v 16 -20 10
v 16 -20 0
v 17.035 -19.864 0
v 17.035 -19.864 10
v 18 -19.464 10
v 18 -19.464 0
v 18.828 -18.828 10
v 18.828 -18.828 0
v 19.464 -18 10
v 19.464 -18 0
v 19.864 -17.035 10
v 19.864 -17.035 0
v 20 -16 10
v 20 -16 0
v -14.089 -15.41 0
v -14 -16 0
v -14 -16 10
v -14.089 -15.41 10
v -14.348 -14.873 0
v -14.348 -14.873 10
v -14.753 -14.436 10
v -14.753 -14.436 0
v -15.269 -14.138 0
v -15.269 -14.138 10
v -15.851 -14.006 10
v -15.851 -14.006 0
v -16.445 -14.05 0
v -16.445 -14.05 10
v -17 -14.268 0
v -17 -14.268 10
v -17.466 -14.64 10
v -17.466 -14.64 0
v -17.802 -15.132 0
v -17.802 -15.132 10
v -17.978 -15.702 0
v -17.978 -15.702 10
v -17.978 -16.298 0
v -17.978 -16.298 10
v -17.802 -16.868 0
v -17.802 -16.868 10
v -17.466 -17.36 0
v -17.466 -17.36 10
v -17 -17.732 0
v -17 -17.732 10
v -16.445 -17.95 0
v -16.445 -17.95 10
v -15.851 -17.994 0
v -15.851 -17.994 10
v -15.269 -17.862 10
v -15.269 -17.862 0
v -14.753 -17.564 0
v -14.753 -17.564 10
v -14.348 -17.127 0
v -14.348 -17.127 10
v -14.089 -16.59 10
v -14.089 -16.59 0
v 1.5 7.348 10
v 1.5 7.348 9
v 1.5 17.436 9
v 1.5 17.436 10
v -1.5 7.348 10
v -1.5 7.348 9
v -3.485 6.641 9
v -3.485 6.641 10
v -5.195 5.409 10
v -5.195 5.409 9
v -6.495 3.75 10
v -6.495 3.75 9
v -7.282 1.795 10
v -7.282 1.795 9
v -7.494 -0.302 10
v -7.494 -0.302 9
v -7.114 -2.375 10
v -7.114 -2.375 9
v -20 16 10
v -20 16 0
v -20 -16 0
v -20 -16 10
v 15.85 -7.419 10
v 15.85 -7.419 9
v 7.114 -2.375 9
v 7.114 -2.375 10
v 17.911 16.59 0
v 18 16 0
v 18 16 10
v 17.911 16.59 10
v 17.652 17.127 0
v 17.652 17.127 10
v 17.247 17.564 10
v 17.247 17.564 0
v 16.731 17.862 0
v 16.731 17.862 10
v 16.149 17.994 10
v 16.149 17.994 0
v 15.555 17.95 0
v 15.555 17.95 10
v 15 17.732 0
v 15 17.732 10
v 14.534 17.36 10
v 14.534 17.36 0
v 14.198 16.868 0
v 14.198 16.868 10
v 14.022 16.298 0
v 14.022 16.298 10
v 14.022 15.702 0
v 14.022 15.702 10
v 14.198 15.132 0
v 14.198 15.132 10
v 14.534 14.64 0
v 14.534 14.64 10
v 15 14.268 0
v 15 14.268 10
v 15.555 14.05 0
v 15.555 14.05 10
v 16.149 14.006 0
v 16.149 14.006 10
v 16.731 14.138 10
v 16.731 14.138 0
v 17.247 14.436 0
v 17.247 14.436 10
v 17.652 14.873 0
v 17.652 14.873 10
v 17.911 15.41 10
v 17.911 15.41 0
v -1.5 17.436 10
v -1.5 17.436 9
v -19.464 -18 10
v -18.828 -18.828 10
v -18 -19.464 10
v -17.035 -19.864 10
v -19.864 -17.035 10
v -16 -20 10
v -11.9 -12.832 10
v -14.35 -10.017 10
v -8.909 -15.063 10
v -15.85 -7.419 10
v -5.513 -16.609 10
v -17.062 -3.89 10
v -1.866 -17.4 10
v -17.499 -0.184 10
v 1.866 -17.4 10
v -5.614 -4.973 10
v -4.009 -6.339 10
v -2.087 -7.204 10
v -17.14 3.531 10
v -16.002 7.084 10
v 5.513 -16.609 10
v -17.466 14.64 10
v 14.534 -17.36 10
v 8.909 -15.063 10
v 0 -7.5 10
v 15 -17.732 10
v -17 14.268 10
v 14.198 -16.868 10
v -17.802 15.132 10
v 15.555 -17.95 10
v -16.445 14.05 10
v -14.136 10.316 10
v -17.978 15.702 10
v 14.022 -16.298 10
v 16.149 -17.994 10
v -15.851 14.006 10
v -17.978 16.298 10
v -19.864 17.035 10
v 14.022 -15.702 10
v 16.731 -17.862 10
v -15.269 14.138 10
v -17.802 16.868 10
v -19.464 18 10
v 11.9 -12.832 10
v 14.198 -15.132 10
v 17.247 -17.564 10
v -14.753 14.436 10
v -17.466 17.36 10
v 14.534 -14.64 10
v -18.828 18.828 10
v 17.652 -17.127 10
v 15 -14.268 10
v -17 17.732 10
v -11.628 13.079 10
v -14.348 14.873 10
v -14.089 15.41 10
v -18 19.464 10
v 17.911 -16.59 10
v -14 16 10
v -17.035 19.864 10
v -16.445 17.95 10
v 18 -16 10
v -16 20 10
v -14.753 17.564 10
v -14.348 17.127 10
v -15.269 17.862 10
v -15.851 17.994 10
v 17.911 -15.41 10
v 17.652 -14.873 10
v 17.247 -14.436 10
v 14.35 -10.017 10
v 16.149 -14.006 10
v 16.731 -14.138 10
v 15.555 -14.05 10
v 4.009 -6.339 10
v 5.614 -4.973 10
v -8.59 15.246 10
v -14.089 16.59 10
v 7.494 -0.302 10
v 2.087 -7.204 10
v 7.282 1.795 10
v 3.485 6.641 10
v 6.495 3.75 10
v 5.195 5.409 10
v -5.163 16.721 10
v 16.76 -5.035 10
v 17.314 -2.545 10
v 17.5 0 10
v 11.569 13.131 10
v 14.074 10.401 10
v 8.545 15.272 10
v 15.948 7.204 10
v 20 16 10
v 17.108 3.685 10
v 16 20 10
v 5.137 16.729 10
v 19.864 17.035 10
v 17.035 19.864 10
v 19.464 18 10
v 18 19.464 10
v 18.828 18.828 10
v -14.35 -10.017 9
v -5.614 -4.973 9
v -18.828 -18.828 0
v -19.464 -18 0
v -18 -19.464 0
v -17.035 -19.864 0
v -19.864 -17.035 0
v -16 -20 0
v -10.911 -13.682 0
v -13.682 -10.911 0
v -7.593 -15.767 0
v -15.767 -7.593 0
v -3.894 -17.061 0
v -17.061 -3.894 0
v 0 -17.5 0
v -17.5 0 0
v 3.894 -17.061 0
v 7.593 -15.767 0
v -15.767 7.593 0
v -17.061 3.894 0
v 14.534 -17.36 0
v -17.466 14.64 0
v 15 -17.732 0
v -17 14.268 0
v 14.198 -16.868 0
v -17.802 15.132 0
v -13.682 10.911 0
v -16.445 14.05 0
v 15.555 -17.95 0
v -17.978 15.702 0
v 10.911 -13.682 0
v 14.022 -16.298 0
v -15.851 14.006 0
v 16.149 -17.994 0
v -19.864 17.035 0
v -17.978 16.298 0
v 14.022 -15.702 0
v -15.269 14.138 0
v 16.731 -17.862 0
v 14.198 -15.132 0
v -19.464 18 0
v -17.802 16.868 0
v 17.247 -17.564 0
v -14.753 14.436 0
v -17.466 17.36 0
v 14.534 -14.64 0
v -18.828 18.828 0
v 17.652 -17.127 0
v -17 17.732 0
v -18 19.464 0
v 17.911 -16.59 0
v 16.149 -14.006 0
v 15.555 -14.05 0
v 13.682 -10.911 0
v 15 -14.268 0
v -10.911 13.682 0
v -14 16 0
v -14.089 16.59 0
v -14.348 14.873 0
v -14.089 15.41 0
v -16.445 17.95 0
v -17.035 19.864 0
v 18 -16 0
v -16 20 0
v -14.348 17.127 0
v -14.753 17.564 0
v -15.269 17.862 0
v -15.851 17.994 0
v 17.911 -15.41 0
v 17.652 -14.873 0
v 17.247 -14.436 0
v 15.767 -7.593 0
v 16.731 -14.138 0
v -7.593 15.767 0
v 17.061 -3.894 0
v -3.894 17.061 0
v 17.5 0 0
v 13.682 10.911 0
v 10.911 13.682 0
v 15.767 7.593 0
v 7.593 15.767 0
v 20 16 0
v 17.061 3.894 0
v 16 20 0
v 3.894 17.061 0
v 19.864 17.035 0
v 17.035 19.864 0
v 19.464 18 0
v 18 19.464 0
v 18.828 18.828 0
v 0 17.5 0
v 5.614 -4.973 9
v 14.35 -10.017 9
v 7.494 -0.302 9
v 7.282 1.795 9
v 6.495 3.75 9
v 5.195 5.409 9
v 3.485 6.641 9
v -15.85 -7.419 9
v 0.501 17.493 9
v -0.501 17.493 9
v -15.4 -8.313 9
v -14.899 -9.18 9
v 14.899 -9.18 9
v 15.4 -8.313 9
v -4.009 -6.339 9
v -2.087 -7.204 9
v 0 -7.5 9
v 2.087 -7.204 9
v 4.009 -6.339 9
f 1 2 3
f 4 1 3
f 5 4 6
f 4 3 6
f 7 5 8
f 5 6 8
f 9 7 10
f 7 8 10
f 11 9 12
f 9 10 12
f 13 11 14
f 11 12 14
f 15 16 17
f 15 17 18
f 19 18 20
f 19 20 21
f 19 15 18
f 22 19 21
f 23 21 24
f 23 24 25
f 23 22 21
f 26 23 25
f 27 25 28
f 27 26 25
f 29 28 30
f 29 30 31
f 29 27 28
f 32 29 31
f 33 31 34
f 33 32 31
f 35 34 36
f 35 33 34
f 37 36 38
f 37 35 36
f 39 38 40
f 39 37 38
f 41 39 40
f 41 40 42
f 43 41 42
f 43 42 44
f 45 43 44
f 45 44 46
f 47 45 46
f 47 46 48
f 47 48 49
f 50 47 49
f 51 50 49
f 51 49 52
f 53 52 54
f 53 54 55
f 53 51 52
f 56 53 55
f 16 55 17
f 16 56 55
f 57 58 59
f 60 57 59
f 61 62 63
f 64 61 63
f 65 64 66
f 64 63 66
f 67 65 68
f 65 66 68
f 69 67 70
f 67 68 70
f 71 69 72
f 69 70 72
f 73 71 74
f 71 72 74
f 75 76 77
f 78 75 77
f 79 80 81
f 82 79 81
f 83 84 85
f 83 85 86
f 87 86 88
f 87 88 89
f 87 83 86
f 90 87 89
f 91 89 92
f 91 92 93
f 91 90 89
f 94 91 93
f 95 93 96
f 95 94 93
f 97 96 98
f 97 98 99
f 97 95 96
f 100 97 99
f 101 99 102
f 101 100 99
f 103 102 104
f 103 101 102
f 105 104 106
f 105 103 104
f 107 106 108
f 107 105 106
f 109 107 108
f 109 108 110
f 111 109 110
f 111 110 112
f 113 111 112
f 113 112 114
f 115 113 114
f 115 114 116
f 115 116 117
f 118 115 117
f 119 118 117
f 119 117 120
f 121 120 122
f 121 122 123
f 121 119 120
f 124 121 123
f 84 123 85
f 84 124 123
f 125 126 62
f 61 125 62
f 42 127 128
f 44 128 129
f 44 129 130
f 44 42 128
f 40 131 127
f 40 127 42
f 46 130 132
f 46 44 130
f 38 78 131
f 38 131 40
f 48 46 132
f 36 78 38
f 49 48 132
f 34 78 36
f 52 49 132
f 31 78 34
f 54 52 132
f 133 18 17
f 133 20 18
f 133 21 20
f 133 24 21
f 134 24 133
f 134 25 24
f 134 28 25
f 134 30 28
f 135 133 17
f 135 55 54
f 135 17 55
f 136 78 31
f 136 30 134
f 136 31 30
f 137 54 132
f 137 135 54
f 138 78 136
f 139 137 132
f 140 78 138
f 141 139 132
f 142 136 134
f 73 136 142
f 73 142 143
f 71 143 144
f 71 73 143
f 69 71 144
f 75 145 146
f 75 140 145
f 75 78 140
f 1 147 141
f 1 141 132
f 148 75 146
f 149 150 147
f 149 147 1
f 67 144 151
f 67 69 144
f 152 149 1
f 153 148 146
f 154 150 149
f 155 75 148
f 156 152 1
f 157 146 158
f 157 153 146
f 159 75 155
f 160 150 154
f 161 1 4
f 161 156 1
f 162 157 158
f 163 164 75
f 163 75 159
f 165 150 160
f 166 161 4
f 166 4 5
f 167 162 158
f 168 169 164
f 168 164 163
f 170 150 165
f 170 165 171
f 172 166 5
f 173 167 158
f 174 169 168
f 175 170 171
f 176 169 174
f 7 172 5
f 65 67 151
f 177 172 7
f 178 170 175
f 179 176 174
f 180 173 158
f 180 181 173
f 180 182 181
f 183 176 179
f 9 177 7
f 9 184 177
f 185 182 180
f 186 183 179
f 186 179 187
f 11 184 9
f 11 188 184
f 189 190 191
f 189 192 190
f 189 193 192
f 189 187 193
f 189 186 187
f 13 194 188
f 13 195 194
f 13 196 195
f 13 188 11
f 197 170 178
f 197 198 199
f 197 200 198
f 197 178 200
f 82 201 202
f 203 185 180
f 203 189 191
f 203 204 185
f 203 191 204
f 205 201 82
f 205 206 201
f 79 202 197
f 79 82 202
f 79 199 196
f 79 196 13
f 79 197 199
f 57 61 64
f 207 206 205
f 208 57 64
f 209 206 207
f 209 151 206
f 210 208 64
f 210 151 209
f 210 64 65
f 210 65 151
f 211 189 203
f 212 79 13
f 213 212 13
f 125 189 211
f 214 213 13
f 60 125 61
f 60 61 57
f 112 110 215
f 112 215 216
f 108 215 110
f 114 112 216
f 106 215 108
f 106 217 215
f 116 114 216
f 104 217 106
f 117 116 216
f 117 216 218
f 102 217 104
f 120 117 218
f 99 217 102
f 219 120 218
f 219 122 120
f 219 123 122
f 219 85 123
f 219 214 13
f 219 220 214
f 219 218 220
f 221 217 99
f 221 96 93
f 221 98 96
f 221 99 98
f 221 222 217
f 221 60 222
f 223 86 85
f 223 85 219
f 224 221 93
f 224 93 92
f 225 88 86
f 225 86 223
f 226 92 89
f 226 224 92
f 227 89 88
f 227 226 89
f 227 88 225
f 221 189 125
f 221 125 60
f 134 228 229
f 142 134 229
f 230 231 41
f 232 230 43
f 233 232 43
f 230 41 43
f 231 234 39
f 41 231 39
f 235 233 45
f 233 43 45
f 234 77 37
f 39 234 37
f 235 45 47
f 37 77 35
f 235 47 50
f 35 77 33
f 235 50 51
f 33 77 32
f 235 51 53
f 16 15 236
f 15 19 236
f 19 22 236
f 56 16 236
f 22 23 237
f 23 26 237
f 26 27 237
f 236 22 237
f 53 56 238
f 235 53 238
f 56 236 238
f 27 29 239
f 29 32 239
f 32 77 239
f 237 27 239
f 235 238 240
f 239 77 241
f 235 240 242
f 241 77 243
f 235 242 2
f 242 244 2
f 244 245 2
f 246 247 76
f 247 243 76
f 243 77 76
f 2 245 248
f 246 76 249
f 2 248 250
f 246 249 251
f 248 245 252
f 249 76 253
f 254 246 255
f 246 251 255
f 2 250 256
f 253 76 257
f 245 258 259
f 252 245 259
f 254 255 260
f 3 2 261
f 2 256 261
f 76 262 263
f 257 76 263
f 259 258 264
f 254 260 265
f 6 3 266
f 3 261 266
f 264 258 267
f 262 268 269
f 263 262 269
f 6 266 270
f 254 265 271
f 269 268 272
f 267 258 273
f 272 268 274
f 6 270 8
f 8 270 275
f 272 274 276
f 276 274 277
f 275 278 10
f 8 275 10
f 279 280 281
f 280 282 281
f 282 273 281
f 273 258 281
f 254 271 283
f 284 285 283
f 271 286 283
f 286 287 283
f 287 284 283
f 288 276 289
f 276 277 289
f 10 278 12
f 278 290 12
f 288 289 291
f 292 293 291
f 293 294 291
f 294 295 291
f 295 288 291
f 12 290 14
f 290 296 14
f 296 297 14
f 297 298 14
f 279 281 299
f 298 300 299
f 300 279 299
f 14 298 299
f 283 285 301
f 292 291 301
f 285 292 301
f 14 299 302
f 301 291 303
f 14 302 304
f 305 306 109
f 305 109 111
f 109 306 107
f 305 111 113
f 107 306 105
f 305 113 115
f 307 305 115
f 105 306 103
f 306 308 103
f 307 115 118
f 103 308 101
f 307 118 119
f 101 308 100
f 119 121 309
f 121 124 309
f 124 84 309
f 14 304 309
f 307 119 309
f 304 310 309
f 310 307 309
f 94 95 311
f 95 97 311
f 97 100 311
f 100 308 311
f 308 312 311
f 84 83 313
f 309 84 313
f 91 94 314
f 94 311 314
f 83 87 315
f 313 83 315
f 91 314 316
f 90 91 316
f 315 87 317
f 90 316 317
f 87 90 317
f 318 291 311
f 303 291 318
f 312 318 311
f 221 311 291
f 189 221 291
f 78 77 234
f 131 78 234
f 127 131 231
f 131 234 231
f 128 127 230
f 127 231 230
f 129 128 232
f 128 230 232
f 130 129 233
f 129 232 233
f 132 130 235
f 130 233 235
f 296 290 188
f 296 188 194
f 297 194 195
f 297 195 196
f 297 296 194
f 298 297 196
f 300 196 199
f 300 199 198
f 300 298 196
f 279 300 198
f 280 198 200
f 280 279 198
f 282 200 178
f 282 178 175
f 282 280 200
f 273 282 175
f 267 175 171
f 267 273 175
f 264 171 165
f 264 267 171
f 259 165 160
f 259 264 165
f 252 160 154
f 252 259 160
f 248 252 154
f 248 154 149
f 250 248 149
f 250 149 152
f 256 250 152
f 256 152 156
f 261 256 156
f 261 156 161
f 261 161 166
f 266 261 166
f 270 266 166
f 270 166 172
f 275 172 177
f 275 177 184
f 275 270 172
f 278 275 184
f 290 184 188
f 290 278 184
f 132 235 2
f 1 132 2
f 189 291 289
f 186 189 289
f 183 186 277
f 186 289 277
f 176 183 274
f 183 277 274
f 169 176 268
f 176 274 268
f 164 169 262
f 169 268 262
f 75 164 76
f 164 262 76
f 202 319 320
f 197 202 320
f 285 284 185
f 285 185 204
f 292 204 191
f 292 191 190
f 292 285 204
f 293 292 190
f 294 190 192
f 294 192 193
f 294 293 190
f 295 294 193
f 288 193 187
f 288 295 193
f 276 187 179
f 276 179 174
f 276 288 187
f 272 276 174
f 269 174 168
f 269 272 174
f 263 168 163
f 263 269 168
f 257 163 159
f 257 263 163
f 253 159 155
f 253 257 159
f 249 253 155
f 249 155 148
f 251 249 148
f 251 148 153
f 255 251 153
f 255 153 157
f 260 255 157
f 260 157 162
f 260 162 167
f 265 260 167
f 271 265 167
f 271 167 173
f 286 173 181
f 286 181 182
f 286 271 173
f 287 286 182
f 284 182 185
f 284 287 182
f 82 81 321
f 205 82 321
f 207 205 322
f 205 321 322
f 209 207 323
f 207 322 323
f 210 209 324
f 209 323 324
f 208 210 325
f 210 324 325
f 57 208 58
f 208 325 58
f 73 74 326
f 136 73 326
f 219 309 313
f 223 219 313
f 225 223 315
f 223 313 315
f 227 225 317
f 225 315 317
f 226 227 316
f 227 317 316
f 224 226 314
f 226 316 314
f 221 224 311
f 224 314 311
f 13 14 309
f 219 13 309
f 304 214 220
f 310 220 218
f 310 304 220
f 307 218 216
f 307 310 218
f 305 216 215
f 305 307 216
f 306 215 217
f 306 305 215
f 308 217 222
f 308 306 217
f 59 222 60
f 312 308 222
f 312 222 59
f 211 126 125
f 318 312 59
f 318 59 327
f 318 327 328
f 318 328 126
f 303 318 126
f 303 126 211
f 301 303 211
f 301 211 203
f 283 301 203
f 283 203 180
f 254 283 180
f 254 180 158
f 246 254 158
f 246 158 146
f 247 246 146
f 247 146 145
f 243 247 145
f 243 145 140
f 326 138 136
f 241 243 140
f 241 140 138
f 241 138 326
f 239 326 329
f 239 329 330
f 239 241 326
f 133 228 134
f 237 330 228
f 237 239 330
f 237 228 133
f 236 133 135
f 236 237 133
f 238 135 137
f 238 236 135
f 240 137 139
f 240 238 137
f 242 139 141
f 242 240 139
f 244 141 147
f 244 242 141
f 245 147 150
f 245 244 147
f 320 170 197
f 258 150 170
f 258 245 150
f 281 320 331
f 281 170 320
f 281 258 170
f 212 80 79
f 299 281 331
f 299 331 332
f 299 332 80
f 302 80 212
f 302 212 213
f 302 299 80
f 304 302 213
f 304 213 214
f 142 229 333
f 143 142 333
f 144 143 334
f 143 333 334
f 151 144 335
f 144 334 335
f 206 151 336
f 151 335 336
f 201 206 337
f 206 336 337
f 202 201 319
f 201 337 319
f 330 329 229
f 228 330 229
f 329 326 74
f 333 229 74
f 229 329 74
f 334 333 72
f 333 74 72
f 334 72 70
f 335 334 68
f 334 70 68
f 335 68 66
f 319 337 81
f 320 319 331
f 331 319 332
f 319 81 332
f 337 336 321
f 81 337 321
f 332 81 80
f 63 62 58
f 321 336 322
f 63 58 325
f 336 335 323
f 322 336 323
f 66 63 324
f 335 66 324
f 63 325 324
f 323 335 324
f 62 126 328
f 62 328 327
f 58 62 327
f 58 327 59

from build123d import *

# Parameters (mm, degrees)
SKETCH_1_R      = 17.5
SKETCH_1_R_2    = 2
EXTRUDE_1_DEPTH = 10
EXTRUDE_START   = -1
EXTRUDE_2_DEPTH = 1


with BuildPart() as part:
    # 草图1 → 凸台-拉伸1 (new body)
    with BuildSketch(Plane.XY):
        with BuildLine():
            Line((-16, -20), (16, -20))
            ThreePointArc((16, -20), (18.828427125, -18.828427125), (20, -16))
            Line((20, -16), (20, 16))
            ThreePointArc((20, 16), (18.828427125, 18.828427125), (16, 20))
            Line((16, 20), (-16, 20))
            ThreePointArc((-16, 20), (-18.828427125, 18.828427125), (-20, 16))
            Line((-20, 16), (-20, -16))
            ThreePointArc((-20, -16), (-18.828427125, -18.828427125), (-16, -20))
        make_face()
        Circle(SKETCH_1_R, mode=Mode.SUBTRACT)
        with Locations((-16, 16)):
            Circle(SKETCH_1_R_2, mode=Mode.SUBTRACT)
        with Locations((16, 16)):
            Circle(SKETCH_1_R_2, mode=Mode.SUBTRACT)
        with Locations((16, -16)):
            Circle(SKETCH_1_R_2, mode=Mode.SUBTRACT)
        with Locations((-16, -16)):
            Circle(SKETCH_1_R_2, mode=Mode.SUBTRACT)
    extrude(amount=EXTRUDE_1_DEPTH)

    # 草图2 → 凸台-拉伸2 (add)
    with BuildSketch(Plane.XY.offset(10).offset(EXTRUDE_START)):
        with BuildLine():
            Line((-1.5, 17.435595774), (-1.5, 7.348469228))
            ThreePointArc((-1.5, 7.348469228), (-6.495190528, 3.75), (-7.113961031, -2.375196508))
            Line((-7.113961031, -2.375196508), (-15.849668871, -7.418759781))
            ThreePointArc((-15.849668871, -7.418759781), (-15.155444566, -8.75), (-14.349668871, -10.016835993))
            Line((-14.349668871, -10.016835993), (-5.613961031, -4.97327272))
            ThreePointArc((-5.613961031, -4.97327272), (0, -7.5), (5.613961031, -4.97327272))
            Line((5.613961031, -4.97327272), (14.349668871, -10.016835993))
            ThreePointArc((14.349668871, -10.016835993), (15.155444566, -8.75), (15.849668871, -7.418759781))
            Line((15.849668871, -7.418759781), (7.113961031, -2.375196508))
            ThreePointArc((7.113961031, -2.375196508), (6.495190528, 3.75), (1.5, 7.348469228))
            Line((1.5, 7.348469228), (1.5, 17.435595774))
            ThreePointArc((1.5, 17.435595774), (0, 17.5), (-1.5, 17.435595774))
        make_face()
    extrude(amount=EXTRUDE_2_DEPTH)


solid = part.part
